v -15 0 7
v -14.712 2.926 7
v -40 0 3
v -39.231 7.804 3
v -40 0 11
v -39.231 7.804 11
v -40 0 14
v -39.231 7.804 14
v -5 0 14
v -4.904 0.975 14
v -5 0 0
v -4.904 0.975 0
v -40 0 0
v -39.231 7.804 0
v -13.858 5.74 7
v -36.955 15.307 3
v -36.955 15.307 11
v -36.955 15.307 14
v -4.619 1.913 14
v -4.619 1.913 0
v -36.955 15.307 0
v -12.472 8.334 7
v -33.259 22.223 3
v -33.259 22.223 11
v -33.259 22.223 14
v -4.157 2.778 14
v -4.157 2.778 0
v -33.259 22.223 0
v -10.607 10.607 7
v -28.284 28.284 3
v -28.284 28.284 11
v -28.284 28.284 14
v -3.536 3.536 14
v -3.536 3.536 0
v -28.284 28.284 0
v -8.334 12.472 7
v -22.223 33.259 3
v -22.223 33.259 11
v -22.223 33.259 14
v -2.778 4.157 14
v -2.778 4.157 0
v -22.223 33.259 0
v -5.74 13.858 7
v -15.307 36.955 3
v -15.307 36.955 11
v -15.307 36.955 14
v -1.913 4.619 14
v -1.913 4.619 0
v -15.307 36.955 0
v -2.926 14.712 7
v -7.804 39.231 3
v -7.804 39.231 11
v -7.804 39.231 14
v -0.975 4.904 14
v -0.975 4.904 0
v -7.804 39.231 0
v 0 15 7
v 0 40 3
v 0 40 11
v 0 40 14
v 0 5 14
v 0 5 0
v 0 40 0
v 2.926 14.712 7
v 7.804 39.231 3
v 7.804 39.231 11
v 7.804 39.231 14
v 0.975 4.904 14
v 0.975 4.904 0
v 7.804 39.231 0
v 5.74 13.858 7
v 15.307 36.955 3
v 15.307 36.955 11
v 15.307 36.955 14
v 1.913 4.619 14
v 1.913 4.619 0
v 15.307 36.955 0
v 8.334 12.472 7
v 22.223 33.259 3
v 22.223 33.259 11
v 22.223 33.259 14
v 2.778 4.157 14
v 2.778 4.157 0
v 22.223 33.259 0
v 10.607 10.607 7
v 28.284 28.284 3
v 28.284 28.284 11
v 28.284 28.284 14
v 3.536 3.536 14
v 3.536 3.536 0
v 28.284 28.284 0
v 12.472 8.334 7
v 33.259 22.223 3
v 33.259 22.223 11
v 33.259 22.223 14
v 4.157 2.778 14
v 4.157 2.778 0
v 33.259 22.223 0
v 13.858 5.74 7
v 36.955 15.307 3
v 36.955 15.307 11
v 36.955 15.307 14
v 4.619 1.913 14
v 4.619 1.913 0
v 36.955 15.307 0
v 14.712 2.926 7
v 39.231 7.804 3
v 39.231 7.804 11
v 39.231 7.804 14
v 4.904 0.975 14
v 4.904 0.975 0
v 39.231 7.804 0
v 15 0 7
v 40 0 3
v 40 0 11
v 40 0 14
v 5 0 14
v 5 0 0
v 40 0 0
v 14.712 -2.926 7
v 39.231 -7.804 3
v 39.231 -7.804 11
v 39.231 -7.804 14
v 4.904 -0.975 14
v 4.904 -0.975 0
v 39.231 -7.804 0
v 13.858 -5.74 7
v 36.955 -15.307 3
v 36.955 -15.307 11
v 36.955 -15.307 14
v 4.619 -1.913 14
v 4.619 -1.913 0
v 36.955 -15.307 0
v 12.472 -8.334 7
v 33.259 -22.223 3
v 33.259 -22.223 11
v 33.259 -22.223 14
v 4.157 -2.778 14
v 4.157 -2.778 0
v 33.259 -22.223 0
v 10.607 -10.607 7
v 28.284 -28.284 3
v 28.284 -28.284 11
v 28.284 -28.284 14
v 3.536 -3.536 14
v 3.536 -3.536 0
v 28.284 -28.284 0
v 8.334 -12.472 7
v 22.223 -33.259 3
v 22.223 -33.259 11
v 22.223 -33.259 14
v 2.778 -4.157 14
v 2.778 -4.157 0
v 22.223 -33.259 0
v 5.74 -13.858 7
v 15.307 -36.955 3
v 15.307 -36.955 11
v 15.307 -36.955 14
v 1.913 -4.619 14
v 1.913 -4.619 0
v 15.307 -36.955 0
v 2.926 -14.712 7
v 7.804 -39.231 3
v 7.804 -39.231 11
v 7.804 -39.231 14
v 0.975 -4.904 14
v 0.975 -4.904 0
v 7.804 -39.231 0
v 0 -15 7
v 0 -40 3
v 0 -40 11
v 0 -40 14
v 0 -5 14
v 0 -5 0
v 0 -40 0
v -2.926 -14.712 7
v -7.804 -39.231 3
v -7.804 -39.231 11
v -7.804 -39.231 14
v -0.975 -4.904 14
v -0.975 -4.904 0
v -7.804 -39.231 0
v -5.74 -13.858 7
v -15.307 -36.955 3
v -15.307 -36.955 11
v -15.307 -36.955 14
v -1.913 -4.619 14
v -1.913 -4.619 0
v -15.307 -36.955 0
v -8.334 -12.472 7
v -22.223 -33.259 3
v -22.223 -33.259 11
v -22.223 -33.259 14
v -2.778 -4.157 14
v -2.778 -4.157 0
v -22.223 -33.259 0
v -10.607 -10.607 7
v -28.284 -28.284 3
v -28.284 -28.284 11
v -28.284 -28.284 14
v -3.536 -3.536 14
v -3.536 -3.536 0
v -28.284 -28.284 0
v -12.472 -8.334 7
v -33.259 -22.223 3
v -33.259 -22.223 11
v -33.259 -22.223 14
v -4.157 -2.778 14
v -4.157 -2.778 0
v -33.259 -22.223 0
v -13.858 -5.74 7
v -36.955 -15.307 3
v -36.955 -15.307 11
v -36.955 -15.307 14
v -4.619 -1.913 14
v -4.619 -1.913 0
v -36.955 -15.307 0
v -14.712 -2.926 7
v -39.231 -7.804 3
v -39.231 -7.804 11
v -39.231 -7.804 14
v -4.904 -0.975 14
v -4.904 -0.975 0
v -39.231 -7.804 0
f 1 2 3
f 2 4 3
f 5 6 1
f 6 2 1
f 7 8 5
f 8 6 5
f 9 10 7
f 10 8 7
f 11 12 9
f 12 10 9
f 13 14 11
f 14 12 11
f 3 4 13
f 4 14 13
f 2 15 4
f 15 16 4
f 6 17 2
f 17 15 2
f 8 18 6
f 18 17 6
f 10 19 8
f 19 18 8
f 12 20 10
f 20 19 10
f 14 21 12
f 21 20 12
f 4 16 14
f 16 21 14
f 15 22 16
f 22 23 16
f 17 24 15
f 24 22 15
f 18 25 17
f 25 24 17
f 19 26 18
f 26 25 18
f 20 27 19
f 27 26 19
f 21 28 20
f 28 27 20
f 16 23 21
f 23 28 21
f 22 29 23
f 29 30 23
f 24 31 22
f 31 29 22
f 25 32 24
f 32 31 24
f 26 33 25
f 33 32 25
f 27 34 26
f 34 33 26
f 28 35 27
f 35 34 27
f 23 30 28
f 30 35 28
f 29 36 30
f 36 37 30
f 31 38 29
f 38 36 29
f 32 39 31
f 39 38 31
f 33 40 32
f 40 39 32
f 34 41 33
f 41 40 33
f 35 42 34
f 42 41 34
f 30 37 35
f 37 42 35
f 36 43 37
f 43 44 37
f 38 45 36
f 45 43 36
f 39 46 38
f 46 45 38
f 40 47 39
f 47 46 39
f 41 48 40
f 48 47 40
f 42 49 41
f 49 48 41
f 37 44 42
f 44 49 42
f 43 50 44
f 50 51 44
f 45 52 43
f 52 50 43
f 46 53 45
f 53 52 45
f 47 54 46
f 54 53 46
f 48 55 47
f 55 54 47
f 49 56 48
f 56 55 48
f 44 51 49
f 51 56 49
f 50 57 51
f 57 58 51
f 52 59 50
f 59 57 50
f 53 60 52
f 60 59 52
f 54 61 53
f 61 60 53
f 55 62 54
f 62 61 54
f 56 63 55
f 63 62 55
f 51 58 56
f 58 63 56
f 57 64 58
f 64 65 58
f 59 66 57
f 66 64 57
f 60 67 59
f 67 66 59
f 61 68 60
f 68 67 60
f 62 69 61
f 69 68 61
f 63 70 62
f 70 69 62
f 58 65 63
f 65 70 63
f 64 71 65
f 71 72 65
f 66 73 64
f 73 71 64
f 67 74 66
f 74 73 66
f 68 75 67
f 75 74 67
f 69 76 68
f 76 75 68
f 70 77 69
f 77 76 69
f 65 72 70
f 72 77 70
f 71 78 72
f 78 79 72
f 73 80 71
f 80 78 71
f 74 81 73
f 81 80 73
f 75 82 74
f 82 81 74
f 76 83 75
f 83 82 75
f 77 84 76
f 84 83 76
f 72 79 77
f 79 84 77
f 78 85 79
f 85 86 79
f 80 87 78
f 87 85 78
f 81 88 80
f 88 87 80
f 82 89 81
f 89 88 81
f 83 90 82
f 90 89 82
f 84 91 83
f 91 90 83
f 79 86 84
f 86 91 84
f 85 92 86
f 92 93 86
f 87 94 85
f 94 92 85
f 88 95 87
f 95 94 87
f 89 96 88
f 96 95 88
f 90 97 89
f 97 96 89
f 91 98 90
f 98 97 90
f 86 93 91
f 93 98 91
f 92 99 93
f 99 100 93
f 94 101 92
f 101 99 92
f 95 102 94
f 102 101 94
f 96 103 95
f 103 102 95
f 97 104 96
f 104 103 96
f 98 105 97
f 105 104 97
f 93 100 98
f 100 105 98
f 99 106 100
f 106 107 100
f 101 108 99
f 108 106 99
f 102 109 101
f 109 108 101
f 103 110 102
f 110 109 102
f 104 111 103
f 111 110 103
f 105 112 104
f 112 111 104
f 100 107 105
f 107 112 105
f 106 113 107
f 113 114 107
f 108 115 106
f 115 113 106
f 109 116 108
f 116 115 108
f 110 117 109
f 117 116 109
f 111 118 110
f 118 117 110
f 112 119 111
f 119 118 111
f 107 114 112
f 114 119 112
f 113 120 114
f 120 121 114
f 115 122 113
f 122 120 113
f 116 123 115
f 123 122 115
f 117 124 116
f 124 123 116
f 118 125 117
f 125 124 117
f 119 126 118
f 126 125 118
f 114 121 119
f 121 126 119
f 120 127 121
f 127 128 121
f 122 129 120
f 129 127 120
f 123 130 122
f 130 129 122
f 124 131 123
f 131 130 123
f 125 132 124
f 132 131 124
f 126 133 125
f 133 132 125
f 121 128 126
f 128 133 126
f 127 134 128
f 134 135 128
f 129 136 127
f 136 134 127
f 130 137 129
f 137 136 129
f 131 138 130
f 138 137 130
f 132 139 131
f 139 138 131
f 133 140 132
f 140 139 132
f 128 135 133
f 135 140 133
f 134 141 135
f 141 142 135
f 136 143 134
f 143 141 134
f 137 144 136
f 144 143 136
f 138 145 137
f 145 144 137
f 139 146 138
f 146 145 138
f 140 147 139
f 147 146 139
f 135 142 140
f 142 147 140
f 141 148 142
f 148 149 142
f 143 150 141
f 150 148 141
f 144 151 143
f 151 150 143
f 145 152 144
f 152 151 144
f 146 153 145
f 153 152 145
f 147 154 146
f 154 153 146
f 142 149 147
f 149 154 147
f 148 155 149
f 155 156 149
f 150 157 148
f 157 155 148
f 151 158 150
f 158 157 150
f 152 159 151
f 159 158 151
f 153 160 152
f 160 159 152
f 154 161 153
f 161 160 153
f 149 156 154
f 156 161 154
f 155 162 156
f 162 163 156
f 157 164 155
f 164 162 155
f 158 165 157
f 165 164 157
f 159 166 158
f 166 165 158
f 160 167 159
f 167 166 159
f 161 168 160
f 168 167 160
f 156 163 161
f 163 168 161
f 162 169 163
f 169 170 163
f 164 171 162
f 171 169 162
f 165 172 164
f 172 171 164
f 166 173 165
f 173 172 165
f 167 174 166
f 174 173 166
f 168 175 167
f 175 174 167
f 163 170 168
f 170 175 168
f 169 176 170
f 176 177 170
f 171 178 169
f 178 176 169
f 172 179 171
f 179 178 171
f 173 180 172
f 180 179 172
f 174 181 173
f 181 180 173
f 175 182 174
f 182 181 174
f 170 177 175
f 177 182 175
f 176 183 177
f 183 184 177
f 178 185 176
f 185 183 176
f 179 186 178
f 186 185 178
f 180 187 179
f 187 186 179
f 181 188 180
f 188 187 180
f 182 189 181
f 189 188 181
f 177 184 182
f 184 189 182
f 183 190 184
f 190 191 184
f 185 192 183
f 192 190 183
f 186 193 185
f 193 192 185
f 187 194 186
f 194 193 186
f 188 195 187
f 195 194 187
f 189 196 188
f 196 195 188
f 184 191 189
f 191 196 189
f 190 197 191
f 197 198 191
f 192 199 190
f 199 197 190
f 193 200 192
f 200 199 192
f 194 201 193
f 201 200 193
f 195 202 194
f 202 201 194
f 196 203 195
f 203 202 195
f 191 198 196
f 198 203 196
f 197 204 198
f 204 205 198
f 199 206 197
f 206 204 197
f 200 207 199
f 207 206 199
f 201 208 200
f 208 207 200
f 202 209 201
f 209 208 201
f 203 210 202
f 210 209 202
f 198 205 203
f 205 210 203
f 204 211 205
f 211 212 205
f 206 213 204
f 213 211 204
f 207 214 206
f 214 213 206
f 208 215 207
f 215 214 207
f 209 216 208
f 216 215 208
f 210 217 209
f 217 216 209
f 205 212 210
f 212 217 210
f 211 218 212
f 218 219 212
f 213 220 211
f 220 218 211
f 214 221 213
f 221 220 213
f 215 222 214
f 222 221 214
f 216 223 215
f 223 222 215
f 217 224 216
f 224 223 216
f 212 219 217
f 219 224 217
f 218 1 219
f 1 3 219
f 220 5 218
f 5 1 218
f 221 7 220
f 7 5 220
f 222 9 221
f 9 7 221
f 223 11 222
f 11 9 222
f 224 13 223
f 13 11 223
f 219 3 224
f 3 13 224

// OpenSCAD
$fn = 32;

// ----------------------------------------------------------------------
// Revolved part: V-groove pulley R40
// ----------------------------------------------------------------------

// --- parameters (mm) ---
bore_r = 5;               // bore radius
rim_r = 40;               // rim radius
rim_t = 14;               // rim width
groove_r = 15;            // groove root radius
groove_w = 4;             // groove half width
revolve_angle = 360;      // revolve sweep, degrees

bore_d = 2 * bore_r;
rim_d = 2 * rim_r;
groove_d = 2 * groove_r;

profile = [[5, 0], [40, 0], [40, 3], [15, 7], [40, 11], [40, 14], [5, 14]];  // primary outline, 7 points, counter clockwise

// --- the one profile operation ---
rotate_extrude(angle = revolve_angle) polygon(points = profile);
